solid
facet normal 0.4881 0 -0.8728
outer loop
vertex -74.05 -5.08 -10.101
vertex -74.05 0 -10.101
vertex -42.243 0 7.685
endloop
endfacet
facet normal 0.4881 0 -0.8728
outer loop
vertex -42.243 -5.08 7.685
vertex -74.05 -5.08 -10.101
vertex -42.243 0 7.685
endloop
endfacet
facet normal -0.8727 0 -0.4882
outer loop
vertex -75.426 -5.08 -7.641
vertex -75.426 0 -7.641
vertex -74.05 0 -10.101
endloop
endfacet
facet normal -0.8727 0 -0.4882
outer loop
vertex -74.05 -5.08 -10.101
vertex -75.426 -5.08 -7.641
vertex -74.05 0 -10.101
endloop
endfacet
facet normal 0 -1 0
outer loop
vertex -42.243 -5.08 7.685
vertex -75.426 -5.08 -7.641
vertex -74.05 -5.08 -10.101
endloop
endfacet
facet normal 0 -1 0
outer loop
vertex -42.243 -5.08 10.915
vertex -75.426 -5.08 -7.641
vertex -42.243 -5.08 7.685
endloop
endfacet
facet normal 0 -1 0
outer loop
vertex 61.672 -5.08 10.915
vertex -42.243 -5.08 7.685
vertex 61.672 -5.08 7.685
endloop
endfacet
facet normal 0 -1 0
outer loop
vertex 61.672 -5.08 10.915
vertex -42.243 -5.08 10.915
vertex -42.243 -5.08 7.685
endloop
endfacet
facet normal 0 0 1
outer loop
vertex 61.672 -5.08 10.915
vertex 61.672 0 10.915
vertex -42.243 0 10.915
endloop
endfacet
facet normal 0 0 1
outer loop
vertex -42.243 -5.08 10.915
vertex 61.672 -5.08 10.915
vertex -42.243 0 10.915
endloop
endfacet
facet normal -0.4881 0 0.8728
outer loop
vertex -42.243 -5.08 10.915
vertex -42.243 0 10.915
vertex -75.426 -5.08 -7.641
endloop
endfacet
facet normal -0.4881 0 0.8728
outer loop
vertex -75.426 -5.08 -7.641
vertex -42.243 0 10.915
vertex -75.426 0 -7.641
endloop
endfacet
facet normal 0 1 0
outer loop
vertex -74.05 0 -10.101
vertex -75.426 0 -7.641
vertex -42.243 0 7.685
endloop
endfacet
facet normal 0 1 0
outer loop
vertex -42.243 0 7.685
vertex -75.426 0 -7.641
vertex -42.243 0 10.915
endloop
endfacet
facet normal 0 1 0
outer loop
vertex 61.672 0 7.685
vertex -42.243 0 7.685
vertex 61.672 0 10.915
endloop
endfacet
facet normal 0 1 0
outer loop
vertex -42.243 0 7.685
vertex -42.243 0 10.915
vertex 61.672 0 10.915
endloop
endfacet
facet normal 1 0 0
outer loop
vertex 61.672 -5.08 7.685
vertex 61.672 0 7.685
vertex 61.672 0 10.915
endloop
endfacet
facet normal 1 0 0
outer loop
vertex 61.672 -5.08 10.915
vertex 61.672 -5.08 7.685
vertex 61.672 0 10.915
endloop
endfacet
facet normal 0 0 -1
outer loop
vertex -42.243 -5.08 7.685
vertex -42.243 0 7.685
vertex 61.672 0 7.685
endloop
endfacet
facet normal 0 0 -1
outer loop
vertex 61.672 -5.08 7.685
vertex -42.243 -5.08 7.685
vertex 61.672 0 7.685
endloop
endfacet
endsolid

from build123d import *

# Parameters (mm, degrees)
F1_DEPTH = 5.08
F4_DEPTH = 5.08
F7_DEPTH = 5.08


with BuildPart() as f1:
    # F0 (on Front) → F1 (new body)
    with BuildSketch(Plane.XZ):
        Polygon((49.2544993758, 7.0634965241), (49.2544956505, 10.4342158884), (-41.1312952638, 10.4342158884), (-69.9499547482, 27.4472031742), (-71.8305518383, 24.2616199337), (-42.6982863529, 7.0634965241), align=None)
    extrude(amount=F1_DEPTH)


with BuildPart() as f4:
    # F3 (on Front) → F4 (new body)
    with BuildSketch(Plane.XZ):
        Polygon((-31.1960466206, 8.5284151137), (64.4119828939, 8.5284151137), (63.5142549872, 13.9479198755), (-31.1960466206, 13.9479198755), (-66.7409883864, -2.9896041492), (-64.6364092827, -7.406255696), align=None)
    extrude(amount=F4_DEPTH)


with BuildPart() as f7:
    # F6 (on Front) → F7 (new body)
    with BuildSketch(Plane.XZ):
        Polygon((61.6721026599, 7.6853110745), (61.6721026599, 10.9154162928), (-42.2426611185, 10.9154162928), (-75.4255279899, -7.6407911256), (-74.0495196081, -10.1014180153), (-42.2426611185, 7.6853110745), align=None)
    extrude(amount=F7_DEPTH)


solid = f7.part
